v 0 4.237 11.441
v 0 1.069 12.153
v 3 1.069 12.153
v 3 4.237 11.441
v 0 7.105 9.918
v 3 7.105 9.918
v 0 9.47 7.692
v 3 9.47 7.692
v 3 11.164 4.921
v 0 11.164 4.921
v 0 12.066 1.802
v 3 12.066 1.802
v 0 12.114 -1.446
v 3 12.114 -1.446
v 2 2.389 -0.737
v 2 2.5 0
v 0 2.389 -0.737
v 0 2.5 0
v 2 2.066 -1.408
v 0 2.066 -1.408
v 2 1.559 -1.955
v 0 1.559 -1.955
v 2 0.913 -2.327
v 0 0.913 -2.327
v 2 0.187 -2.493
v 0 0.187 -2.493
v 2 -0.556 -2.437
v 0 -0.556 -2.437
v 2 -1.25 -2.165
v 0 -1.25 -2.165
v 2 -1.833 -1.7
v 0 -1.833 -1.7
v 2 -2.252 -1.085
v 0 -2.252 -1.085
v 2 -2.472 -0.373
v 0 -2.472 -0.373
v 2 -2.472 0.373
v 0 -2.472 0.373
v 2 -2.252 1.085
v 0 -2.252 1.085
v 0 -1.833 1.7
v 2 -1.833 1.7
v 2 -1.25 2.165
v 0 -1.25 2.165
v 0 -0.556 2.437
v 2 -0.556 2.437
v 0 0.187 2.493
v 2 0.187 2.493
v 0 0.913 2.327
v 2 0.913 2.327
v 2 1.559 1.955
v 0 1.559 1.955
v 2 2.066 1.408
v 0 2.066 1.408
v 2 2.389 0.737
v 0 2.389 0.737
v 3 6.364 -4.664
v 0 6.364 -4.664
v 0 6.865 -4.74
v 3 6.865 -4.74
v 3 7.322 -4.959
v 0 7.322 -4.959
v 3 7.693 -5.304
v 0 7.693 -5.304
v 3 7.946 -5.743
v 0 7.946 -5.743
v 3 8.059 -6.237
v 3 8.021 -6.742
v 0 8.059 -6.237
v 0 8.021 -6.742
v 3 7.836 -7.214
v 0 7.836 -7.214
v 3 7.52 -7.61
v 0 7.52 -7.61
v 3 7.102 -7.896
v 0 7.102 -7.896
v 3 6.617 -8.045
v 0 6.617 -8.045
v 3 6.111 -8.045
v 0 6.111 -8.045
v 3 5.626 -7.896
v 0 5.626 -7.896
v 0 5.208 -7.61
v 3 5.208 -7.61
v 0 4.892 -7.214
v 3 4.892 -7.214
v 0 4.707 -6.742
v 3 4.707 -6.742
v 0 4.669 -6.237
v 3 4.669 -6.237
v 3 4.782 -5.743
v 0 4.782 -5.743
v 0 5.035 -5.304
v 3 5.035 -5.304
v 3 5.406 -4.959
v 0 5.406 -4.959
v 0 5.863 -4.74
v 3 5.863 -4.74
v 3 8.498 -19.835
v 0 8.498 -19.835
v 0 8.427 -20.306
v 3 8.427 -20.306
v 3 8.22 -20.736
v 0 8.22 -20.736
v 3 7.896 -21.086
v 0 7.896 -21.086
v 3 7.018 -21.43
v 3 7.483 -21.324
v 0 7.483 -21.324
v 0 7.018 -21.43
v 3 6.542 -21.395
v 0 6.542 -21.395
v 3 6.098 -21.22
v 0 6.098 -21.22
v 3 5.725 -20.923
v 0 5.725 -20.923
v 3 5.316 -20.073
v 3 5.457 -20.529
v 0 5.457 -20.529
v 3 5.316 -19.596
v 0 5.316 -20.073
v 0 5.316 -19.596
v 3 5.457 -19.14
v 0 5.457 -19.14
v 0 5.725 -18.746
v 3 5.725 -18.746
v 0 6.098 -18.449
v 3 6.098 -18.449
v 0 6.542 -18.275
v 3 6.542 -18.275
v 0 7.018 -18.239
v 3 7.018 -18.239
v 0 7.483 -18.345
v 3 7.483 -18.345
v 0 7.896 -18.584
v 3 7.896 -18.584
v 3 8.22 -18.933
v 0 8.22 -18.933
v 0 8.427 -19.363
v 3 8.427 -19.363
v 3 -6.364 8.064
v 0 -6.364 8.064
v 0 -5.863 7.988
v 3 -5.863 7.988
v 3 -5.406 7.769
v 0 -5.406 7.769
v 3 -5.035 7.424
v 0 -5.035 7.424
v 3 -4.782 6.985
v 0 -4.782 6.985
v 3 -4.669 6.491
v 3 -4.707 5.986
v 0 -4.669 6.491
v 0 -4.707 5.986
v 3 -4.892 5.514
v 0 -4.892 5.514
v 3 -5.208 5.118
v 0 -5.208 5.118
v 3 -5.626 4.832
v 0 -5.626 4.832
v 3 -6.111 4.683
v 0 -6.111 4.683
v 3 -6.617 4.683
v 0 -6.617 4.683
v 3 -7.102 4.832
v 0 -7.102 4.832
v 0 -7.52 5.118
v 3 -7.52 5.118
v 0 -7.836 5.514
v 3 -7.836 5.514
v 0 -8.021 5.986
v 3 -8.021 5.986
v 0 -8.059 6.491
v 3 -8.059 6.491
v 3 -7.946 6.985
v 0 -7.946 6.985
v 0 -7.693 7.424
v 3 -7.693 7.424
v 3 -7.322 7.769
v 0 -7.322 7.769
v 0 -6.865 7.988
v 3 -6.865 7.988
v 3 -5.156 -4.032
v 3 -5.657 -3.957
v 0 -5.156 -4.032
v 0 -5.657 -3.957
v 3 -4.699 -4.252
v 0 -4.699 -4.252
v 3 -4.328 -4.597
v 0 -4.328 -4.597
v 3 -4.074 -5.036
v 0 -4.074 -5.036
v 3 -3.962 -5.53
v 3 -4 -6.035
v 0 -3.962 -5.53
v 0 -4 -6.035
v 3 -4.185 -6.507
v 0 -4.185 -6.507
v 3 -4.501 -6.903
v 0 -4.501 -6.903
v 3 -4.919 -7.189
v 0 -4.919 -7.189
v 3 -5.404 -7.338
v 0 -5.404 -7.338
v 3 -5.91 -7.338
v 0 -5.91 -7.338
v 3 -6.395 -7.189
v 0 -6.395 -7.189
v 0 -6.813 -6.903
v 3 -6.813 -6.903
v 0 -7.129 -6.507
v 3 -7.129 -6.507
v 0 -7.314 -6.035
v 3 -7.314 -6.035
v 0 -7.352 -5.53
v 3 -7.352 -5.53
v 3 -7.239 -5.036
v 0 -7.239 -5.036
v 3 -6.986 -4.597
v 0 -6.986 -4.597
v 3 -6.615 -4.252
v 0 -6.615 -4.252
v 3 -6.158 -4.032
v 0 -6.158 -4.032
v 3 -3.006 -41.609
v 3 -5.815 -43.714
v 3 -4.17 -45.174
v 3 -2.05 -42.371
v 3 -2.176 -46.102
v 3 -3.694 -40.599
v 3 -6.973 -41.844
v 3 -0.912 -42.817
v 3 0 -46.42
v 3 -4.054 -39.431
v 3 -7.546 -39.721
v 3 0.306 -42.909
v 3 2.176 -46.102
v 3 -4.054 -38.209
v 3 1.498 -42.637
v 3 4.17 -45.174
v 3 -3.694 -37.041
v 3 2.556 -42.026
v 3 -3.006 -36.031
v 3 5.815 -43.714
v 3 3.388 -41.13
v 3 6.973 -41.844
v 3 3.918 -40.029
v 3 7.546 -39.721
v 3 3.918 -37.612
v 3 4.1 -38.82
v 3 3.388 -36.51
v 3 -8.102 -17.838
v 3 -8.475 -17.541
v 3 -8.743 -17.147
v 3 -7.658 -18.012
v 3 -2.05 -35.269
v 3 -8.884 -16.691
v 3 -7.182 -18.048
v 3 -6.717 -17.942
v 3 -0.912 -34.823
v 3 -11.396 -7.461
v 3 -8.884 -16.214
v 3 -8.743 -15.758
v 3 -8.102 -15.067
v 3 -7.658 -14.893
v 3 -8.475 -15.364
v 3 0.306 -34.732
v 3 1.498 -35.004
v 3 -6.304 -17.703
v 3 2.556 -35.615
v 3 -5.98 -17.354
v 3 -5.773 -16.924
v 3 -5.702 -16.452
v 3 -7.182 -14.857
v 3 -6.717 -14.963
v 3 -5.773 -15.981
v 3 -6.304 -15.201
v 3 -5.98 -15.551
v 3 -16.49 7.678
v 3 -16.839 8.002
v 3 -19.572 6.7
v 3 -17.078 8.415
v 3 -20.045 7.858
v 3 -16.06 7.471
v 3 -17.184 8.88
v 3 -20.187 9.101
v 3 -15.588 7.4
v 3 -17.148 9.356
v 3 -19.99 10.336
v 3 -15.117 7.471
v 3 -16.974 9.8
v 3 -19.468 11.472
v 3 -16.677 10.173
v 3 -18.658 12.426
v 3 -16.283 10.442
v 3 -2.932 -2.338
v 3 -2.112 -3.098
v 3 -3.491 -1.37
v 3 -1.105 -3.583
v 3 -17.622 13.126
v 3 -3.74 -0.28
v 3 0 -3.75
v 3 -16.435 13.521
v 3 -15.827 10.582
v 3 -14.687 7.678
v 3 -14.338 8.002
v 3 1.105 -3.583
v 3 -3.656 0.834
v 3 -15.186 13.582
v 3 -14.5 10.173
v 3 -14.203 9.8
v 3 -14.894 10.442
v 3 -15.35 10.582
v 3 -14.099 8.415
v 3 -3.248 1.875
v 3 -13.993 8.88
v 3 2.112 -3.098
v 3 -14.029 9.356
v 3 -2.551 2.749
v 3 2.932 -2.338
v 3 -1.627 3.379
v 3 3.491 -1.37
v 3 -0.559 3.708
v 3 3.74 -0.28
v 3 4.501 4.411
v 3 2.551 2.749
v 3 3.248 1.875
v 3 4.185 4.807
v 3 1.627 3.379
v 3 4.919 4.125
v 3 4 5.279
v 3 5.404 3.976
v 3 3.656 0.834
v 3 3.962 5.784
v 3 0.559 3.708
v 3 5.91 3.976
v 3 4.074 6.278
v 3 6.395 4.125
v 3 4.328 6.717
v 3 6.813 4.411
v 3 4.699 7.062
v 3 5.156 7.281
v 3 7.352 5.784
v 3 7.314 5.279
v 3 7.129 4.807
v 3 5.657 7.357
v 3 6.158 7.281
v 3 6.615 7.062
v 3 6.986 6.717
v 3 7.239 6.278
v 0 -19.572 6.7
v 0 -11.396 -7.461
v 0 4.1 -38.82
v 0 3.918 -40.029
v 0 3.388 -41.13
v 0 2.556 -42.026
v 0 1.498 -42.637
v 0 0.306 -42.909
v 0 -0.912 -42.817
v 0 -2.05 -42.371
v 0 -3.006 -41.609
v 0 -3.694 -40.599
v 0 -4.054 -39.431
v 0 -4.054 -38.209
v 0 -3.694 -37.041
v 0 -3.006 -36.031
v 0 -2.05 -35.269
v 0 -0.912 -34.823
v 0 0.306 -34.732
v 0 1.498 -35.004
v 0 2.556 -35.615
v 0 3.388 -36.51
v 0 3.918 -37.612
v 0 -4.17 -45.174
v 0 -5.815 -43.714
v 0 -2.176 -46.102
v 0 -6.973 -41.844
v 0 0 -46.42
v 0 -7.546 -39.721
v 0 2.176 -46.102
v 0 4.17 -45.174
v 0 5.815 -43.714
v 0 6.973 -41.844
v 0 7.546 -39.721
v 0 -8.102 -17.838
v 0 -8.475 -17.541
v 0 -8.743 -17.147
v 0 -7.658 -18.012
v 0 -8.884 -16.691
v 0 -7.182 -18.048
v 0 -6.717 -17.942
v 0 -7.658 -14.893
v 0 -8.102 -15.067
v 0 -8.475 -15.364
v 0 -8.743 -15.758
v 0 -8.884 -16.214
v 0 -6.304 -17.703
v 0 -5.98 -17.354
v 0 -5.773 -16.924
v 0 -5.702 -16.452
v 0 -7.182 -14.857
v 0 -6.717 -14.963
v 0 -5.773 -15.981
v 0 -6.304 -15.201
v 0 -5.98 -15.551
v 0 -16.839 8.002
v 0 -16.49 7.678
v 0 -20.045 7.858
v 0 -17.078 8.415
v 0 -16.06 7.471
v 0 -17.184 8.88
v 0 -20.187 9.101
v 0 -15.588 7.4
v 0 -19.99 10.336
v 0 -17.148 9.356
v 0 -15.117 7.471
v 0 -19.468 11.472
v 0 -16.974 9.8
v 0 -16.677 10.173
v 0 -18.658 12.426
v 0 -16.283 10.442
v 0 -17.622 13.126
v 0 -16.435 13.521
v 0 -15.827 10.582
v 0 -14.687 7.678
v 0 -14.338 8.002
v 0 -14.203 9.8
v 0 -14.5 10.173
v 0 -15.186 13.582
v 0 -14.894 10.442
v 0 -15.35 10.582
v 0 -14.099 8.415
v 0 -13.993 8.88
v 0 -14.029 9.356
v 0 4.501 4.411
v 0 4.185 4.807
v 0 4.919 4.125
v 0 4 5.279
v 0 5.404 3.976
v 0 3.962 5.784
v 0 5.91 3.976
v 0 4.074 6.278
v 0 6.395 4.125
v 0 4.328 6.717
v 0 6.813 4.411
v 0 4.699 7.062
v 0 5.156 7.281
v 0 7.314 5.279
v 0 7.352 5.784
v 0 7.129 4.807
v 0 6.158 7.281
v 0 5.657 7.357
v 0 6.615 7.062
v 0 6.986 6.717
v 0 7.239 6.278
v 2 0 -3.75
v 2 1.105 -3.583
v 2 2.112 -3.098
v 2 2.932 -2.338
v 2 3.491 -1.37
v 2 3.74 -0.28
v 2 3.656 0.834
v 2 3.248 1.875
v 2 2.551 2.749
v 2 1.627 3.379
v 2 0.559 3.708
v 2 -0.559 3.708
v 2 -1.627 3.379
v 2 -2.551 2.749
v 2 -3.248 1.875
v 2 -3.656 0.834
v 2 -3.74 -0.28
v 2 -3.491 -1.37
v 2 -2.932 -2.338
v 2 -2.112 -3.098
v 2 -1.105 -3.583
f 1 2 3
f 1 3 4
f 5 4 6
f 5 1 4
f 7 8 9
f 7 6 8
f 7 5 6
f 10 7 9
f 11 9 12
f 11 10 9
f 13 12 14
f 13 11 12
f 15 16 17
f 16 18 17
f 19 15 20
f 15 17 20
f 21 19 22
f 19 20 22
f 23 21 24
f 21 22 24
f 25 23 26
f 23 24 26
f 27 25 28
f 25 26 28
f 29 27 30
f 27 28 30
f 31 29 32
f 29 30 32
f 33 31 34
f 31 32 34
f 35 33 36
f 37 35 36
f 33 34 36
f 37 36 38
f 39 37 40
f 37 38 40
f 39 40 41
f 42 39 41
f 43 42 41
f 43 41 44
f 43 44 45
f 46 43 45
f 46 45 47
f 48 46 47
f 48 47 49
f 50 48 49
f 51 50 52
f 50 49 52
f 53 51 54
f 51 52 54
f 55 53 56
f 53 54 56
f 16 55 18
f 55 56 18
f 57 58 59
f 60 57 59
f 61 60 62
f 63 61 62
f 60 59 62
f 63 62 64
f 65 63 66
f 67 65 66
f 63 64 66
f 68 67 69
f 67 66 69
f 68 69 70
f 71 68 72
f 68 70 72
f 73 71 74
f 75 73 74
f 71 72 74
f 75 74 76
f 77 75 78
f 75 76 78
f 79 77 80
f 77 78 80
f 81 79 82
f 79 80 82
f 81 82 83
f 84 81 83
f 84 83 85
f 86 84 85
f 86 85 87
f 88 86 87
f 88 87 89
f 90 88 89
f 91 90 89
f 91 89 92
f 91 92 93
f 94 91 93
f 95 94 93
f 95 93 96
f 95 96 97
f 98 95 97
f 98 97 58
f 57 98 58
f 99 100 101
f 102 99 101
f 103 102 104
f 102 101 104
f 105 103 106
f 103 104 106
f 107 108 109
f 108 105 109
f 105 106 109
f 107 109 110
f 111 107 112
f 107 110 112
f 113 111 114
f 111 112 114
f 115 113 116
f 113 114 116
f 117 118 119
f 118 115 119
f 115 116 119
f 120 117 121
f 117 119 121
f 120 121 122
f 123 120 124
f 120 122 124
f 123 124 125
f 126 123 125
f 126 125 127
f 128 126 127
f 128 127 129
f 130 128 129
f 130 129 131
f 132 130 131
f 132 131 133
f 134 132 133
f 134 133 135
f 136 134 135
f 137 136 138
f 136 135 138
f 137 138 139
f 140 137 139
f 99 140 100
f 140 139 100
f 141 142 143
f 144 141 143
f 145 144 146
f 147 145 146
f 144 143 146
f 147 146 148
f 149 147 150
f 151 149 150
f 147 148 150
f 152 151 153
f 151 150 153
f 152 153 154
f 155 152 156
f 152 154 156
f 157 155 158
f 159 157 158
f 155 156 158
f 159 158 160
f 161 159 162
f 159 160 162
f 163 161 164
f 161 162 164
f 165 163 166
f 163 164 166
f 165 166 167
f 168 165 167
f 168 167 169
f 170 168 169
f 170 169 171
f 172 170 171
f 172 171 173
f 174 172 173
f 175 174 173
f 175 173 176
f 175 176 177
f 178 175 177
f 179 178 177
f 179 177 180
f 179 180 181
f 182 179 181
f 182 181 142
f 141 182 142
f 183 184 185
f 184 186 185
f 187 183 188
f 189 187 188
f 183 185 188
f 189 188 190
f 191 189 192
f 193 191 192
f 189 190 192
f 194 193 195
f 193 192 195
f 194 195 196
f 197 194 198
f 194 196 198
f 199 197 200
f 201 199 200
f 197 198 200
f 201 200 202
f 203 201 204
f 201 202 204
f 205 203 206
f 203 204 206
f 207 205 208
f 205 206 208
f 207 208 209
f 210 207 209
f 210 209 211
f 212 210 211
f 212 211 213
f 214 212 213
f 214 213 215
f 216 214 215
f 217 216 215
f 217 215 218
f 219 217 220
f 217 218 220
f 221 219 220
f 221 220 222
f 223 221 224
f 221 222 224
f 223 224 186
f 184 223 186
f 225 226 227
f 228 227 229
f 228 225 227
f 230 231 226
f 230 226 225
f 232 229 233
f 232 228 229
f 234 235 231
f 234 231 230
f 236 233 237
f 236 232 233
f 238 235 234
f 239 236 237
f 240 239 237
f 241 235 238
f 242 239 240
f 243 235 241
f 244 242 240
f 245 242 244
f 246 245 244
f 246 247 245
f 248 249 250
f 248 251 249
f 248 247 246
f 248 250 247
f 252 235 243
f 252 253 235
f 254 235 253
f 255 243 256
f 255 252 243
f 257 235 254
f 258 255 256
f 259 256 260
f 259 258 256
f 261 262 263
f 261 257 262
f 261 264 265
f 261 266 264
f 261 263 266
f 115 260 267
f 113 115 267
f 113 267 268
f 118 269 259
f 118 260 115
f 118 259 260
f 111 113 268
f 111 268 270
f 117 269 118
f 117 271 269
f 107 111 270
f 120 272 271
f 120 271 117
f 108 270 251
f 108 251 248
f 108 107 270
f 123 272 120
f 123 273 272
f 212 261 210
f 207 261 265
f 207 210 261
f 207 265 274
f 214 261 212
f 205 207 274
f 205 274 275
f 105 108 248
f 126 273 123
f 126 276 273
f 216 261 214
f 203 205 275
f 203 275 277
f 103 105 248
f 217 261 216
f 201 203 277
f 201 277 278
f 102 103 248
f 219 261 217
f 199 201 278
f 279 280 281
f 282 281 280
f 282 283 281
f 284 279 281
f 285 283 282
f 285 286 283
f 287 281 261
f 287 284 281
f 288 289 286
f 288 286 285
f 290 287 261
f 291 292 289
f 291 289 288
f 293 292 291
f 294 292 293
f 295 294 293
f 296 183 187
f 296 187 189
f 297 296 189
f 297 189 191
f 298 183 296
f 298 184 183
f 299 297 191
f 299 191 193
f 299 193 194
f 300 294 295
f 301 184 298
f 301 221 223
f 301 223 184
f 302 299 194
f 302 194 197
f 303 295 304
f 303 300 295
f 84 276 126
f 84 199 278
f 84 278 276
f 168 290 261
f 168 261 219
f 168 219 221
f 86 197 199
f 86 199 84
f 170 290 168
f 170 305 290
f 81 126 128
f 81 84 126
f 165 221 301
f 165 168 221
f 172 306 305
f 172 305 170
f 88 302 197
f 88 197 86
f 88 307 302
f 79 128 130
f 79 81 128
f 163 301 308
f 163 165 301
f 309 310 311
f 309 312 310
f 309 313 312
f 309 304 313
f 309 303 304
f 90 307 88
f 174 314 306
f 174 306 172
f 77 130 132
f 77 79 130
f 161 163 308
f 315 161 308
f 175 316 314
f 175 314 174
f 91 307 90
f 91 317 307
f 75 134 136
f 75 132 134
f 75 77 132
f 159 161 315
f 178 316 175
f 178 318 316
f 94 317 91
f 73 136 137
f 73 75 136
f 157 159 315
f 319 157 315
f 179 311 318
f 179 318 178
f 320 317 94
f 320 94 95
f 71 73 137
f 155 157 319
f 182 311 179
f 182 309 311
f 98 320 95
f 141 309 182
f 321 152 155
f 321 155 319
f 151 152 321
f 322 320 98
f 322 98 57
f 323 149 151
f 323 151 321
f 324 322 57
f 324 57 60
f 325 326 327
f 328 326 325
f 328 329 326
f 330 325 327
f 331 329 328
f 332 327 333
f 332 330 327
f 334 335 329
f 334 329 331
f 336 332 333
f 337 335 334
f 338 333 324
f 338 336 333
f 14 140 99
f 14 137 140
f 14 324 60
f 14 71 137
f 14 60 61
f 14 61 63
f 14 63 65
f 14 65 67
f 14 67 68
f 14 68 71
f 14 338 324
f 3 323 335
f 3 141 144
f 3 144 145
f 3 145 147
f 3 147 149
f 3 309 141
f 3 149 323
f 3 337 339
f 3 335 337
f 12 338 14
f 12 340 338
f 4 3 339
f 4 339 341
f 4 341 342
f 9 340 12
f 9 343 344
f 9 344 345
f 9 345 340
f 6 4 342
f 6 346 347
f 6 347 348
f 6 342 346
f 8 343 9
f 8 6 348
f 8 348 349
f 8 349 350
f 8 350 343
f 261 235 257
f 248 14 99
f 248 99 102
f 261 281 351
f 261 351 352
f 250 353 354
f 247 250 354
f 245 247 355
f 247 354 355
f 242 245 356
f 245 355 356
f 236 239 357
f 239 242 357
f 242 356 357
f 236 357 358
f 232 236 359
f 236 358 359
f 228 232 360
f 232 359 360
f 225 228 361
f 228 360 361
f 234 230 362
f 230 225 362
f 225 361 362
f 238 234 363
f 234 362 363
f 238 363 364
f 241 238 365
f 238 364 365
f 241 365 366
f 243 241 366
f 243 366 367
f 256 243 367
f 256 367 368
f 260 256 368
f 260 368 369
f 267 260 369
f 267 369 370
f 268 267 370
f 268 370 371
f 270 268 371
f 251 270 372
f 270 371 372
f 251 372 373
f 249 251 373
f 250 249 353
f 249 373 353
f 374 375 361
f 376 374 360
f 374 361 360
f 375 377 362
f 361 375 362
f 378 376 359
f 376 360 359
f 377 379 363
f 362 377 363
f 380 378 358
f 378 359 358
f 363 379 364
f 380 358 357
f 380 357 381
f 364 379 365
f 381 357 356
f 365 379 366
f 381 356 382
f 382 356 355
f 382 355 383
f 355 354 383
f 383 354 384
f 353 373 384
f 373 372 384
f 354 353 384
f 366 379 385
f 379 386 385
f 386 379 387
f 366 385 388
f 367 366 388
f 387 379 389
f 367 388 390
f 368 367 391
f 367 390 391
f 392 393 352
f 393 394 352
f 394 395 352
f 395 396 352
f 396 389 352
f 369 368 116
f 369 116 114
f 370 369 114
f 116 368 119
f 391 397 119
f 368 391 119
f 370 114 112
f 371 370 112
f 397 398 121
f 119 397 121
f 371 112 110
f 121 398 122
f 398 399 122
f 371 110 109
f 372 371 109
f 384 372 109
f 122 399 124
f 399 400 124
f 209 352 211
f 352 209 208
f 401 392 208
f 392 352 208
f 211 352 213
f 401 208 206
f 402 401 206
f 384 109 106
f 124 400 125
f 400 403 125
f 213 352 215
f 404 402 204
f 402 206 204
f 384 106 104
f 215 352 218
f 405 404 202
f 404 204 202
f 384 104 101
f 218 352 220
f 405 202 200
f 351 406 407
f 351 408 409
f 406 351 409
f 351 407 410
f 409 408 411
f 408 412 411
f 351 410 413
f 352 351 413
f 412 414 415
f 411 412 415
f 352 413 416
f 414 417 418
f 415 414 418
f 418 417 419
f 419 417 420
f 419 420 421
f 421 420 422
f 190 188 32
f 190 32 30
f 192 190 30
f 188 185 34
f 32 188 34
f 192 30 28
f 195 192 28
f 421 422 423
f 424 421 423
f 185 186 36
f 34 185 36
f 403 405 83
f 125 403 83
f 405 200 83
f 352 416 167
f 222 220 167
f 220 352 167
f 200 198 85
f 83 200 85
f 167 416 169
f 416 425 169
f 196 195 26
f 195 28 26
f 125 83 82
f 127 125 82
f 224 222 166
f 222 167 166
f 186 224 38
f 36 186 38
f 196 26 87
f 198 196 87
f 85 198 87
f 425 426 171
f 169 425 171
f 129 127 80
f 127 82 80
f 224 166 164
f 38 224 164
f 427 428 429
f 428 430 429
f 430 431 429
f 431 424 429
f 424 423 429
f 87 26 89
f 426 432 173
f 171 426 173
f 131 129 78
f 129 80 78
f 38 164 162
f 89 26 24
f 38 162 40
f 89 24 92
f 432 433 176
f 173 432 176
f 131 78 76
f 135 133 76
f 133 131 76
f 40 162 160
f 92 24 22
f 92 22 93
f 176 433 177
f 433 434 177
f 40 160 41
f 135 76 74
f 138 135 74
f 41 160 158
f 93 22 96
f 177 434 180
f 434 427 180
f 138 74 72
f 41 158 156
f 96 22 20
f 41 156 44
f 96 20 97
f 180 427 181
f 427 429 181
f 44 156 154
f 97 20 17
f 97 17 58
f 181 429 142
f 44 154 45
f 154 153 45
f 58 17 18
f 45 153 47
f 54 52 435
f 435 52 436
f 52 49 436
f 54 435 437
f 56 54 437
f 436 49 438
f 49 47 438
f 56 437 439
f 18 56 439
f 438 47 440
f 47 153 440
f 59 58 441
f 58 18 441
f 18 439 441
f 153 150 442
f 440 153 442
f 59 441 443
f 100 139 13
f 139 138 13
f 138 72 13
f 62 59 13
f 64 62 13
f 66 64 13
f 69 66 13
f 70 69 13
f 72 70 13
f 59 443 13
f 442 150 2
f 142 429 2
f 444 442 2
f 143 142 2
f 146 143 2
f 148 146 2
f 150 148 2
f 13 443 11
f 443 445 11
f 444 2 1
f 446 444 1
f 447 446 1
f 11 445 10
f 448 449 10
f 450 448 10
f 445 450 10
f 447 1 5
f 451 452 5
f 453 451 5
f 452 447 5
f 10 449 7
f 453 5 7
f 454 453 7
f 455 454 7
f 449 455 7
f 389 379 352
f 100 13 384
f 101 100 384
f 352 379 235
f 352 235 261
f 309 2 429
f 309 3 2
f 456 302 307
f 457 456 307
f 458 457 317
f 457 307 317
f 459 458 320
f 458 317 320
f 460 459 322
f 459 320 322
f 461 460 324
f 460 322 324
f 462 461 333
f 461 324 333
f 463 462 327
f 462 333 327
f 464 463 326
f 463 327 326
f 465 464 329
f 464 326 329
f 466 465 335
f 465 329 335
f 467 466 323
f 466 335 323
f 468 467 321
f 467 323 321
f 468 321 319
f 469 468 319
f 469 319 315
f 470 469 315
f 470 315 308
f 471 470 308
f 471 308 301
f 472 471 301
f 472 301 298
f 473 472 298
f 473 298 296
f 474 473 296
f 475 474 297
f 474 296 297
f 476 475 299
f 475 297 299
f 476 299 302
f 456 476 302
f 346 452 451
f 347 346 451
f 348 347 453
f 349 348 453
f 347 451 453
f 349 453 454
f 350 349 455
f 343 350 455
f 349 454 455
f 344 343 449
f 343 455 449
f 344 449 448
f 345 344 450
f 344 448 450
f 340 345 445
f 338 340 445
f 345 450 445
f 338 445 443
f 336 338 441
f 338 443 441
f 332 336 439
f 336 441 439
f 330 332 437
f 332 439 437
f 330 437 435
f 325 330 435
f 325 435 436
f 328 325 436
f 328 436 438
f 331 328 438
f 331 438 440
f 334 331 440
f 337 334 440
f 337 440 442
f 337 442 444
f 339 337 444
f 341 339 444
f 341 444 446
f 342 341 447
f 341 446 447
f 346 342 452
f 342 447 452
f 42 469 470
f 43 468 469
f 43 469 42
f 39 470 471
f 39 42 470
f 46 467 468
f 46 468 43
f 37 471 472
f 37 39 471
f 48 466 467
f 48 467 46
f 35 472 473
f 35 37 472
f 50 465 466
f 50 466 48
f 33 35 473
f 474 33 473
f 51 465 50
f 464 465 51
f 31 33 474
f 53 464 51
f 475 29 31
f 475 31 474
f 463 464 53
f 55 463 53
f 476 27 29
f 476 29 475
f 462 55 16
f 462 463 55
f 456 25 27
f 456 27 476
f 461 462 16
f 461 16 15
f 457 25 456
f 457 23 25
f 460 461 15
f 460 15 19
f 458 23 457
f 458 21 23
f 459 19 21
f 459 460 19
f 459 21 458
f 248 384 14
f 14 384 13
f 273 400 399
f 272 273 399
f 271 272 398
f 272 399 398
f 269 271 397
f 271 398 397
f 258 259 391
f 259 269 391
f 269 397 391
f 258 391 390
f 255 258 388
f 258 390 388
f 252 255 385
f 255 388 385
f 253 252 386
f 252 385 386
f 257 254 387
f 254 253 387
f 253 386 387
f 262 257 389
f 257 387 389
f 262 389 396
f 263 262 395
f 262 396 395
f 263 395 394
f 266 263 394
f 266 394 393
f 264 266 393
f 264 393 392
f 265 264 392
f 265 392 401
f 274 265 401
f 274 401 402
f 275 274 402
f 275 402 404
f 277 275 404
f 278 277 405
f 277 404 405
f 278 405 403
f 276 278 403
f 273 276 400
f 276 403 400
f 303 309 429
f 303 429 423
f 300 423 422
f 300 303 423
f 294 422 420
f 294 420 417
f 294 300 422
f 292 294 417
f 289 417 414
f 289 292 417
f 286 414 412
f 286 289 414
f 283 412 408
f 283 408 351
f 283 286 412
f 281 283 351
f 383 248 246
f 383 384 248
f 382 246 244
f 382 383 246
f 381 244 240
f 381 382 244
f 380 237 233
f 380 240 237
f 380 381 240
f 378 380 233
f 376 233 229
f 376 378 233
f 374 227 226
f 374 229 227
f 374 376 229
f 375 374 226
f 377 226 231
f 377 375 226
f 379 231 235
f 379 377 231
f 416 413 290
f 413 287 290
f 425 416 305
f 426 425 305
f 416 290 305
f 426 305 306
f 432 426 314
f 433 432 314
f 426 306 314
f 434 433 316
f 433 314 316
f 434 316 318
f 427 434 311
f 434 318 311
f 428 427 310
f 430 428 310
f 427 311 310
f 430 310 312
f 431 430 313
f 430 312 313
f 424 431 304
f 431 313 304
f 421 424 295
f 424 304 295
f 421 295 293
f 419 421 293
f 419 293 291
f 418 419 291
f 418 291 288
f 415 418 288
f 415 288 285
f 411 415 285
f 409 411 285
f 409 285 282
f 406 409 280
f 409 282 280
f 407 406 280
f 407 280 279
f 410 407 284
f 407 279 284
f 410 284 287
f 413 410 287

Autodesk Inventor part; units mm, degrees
ref_plane "YZ Plane" through (0, 0, 0) normal (1, 0, 0) x (0, 1, 0)
ref_plane "XZ Plane" through (0, 0, 0) normal (0, 1, 0) x (-1, 0, 0)
ref_plane "XY Plane" through (0, 0, 0) normal (0, 0, 1) x (1, 0, 0)
sketch "Эскиз1" plane through (0, 0, 0) normal (1, 0, 0) x (0, 1, 0)
  circle A0 centre (35.2311, -22.6062) radius 9.3
  circle A1 centre (0, -38.8201) radius 6.1 construction
  circle A2 centre (0, 0) radius 4.85 construction
  circle A3 centre (35.8147, -49.5529) radius 3.55
  line L0 (6.0968, -38.6237) -> (4.8475, 0.1562) construction
  line L1 (-4.8475, 0.1562) -> (-6.0968, -38.6237) construction
  line L2 (0, 0) -> (0, -38.8201) construction
  circle A4 centre (0, -38.8201) radius 4.1
  circle A5 centre (0, 0) radius 2.5
  circle A6 centre (0, -38.8201) radius 15 construction
  circle A7 centre (0, 0) radius 14 construction
  circle A8 centre (0, -38.8201) radius 7.6
  circle A9 centre (0, 0) radius 7 construction
  line L3 (7.5465, -39.7207) -> (12.114, -1.4456)
  line L4 (-7.5465, -39.7207) -> (-12.114, -1.4456)
  circle A10 centre (0, 0) radius 8.8 construction
  circle A11 centre (0, 0) radius 12.2
  circle A12 centre (6.8983, -19.8347) radius 1.6
  circle A13 centre (-7.3019, -16.4524) radius 1.6
  point P0 (-7, 0)
  point P1 (-7.5465, -39.7207)
  point P2 (-12.114, -1.4456)
  dimension "d0" = 18.6
  dimension "d1" = 12.2
  dimension "d2" = 9.7
  dimension "d3" = 7.1
  dimension "d8" = 38.8201
  dimension "d13" = 38.8
  dimension "d14" = 38.8
  dimension "d23" = 8.2
  dimension "d24" = 5
  dimension "d25" = 30
  dimension "d26" = 28
  dimension "d28" = 14
  dimension "d31" = 17.6
  dimension "d32" = 3.4
  dimension "d56" = 3.5
  dimension "d58" = 3.2
  dimension "d59" = 3
  dimension "d60" = 21
  dimension "d61" = 3.2
  dimension "d62" = 3
  dimension "d63" = 18
extrude "Выдавливание4" add sketch "Эскиз1" along normal blind 3 contours A8 | A8 L4 A11 L3 | A11
sketch "Эскиз4" plane through (0, 0, 0) normal (-1, 0, 0) x (0, 0, 1)
  circle A0 centre (-38.8201, 0) radius 4.1 construction
  arc A1 (-1.4456, -12.114) -> (-1.4456, 12.114) centre (0, 0) ccw construction
  line L0 (-39.7207, 7.5465) -> (-1.4456, 12.114) construction
  arc A2 (-39.7207, 7.5465) -> (-39.7207, -7.5465) centre (-38.8201, 0) ccw construction
  line L1 (-1.4456, -12.114) -> (-39.7207, -7.5465) construction
  line L2 (0, 0) -> (0, 12.2) construction
  arc A3 (-1.4456, -12.114) -> (-1.4456, 12.114) centre (0, 0) ccw construction
  line L3 (0, 0) -> (12.2, 0) construction
  circle A4 centre (5.6569, 5.6569) radius 1.7
  line L4 (5.6569, 5.6569) -> (0, 0) construction
  circle A5 centre (-6.364, 6.364) radius 1.7
  line L5 (0, 0) -> (-6.364, 6.364) construction
  circle A6 centre (-5.6569, -5.6569) radius 1.7
  circle A7 centre (6.364, -6.364) radius 1.7
  dimension "d65" = 45
  dimension "d66" = 3.4
  dimension "d67" = 3.4
  dimension "d68" = 45
  dimension "d69" = 16
  dimension "d70" = 18
extrude "Выдавливание5" cut sketch "Эскиз4" against normal blind 3
sketch "Эскиз5" plane through (3, 0, 0) normal (1, 0, 0) x (0, 0, -1)
  circle A0 centre (0, 0) radius 3.75
  dimension "d38" = 7.5
extrude "Выдавливание6" cut sketch "Эскиз5" against normal blind 1
sketch "Эскиз6" plane through (3, 0, 0) normal (1, 0, 0) x (0, 0, -1)
  circle A0 centre (0, -18) radius 2
  circle A1 centre (0, 0) radius 3.75 construction
  circle A2 centre (-5.6569, 5.6569) radius 1.7 construction
  circle A3 centre (38.8201, 0) radius 4.1 construction
  line L0 (39.7207, 7.5465) -> (1.4456, 12.114) construction
  arc A4 (1.4456, 12.114) -> (1.4456, -12.114) centre (0, 0) ccw construction
  line L1 (1.4456, -12.114) -> (39.7207, -7.5465) construction
  arc A5 (39.7207, -7.5465) -> (39.7207, 7.5465) centre (38.8201, 0) ccw construction
  line L2 (0, 0) -> (0, -26.6004) construction
  circle A6 centre (0, 0) radius 14 construction
  line L3 (-10.8605, -5.5578) -> (-3.5608, -19.8222)
  arc A7 (0, -14) -> (-3.5608, -19.8222) centre (0, -18) ccw construction
  line L4 (2.8284, -20.8284) -> (12.911, -10.7458)
  line L5 (1.4456, -12.114) -> (39.7207, -7.5465) construction
  arc A8 (2.8284, -20.8284) -> (0, -14) centre (0, -18) ccw construction
  arc A9 (-3.5608, -19.8222) -> (2.8284, -20.8284) centre (0, -18) ccw
  line L6 (-10.8605, -5.5578) -> (-10.1465, -5.5578)
  line L7 (-10.1465, -5.5578) -> (-6.8136, -9.4237)
  line L8 (-6.8136, -9.4237) -> (5.1237, -10.512)
  line L9 (5.1237, -10.512) -> (12.911, -10.7458)
  dimension "d42" = 28
  dimension "d41" = 4
  dimension "d43" = 18
  dimension "d44" = 8
  dimension "d45" = 45
extrude "Выдавливание7" [suppressed]
sketch "Эскиз7" plane through (3, 0, 0) normal (1, 0, 0) x (0, 0, -1)
  line L0 (0, 0) -> (0, -29.4139) construction
  circle A0 centre (-9, -15.5885) radius 1.6
  line L1 (-9, -15.5885) -> (0, 0) construction
  circle A1 centre (0, 0) radius 14 construction
  circle A2 centre (0, 0) radius 18 construction
  arc A3 (-6.7, -19.5722) -> (-13.5823, -15.1855) centre (-9, -15.5885) ccw construction
  circle A4 centre (0, 0) radius 3.75 construction
  circle A5 centre (-5.6569, 5.6569) radius 1.7 construction
  circle A6 centre (38.8201, 0) radius 4.1 construction
  line L2 (39.7207, 7.5465) -> (1.4456, 12.114) construction
  arc A7 (1.4456, 12.114) -> (1.4456, -12.114) centre (0, 0) ccw projected
  line L3 (1.4456, -12.114) -> (39.7207, -7.5465) projected
  arc A8 (39.7207, -7.5465) -> (39.7207, 7.5465) centre (38.8201, 0) ccw construction
  line L4 (-12.1531, 1.0686) -> (-13.5823, -15.1855)
  line L5 (-6.7, -19.5722) -> (7.4613, -11.3962)
  line L6 (1.4456, -12.114) -> (39.7207, -7.5465) construction
  arc A9 (-13.5823, -15.1855) -> (-6.7, -19.5722) centre (-9, -15.5885) ccw
  circle A10 centre (-9, -15.5885) radius 4.1
  point P0 (7.4613, -11.3962)
  dimension "d48" = 3.2
  dimension "d49" = 330
  dimension "d50" = 28
  dimension "d51" = 4
  dimension "d53" = 30
  dimension "d57" = 3
  dimension "d71" = 8.2
extrude "Выдавливание8" add sketch "Эскиз7" against normal up to surface (3 mm away) contours A7 L3 L5 A9 L4 | A10
properties part number "right_wall_v1"
